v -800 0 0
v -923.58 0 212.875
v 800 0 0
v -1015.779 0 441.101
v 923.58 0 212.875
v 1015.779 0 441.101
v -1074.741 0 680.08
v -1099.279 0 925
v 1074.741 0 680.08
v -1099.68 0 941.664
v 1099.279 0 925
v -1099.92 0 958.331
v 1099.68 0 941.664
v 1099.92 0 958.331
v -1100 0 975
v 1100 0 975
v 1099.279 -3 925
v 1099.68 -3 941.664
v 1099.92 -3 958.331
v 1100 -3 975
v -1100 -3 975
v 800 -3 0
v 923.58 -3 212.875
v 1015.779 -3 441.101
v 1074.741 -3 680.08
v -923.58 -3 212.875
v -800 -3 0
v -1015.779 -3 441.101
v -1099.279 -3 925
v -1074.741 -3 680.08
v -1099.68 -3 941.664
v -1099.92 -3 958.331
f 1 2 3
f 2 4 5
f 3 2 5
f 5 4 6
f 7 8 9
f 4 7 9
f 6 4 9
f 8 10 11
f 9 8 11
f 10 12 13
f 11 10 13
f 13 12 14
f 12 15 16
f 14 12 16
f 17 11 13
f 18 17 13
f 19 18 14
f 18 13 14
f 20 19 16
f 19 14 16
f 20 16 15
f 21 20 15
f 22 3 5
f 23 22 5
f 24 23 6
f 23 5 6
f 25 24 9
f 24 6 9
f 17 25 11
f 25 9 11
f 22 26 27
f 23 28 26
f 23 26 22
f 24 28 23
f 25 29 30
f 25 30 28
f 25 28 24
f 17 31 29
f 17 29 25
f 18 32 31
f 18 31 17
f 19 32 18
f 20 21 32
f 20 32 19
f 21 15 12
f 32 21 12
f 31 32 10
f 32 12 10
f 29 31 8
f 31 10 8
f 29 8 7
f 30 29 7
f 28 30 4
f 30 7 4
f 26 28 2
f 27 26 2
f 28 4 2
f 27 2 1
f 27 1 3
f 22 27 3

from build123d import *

# Parameters (mm, degrees)
F0_W     = 100
F0_H     = 50
F0_W_2   = 600
F0_W_3   = 50
F0_W_4   = 775
F1_DEPTH = 3


with BuildPart() as f1:
    # F0 (on Front) → F1 (new body)
    with BuildSketch(Plane.XZ):
        with BuildLine():
            Line((-800, 92.0008493777), (-800, 0))
            Line((-800, 0), (-750, 0))
            Line((-750, 0), (-750, 50))
            Line((-750, 50), (-773.2805475772, 50))
            ThreePointArc((-773.2805475772, 50), (-786.7954423389, 70.9017119543), (-800.0000000001, 92.0008493776))
        make_face()
        with Locations((-700, 25)):
            Rectangle(F0_W, F0_H)
        with Locations((-350, 25)):
            Rectangle(F0_W_2, F0_H)
        with Locations((-25, 25)):
            Rectangle(F0_W_3, F0_H)
        with Locations((25, 25)):
            Rectangle(F0_W_3, F0_H)
        with Locations((350, 25)):
            Rectangle(F0_W_2, F0_H)
        with Locations((700, 25)):
            Rectangle(F0_W, F0_H)
        with BuildLine():
            Line((750, 0), (800, 0))
            Line((800, 0), (800, 92.0008493776))
            ThreePointArc((800.0000000001, 92.0008493776), (786.7954423389, 70.9017119543), (773.2805475772, 50))
            Line((773.2805475772, 50), (750, 50))
            Line((750, 50), (750, 0))
        make_face()
        with BuildLine():
            Line((-1049.2577214167, 925), (-1099.279129469, 925))
            ThreePointArc((-1099.279129469, 925), (-1015.7790507756, 441.1008996693), (-800, 0))
            Line((-800, 0), (-800, 92.0008493777))
            ThreePointArc((-800.0000000001, 92.0008493776), (-979.3055551093, 492.139557753), (-1049.2577214167, 925))
        make_face()
        with BuildLine():
            ThreePointArc((800, 0), (1015.7790507756, 441.1008996693), (1099.279129469, 925))
            Line((1099.279129469, 925), (1049.2577214167, 925))
            ThreePointArc((1049.2577214167, 925), (979.3055551094, 492.139557753), (800.0000000001, 92.0008493776))
            Line((800, 92.0008493776), (800, 0))
        make_face()
        with BuildLine():
            ThreePointArc((1099.279129469, 925), (1099.8197730031, 949.9974018634), (1100, 975))
            Line((1100, 975), (1050, 975))
            ThreePointArc((1050, 975), (1049.8144201308, 949.9972452643), (1049.2577214167, 925))
            Line((1049.2577214167, 925), (1099.279129469, 925))
        make_face()
        with BuildLine():
            Line((-1050, 975), (-1100, 975))
            ThreePointArc((-1100, 975), (-1099.8197730031, 949.9974018634), (-1099.279129469, 925))
            Line((-1099.279129469, 925), (-1049.2577214167, 925))
            ThreePointArc((-1049.2577214167, 925), (-1049.8144201308, 949.9972452643), (-1050, 975))
        make_face()
        with BuildLine():
            Line((-800, 925), (-1049.2577214167, 925))
            ThreePointArc((-1049.2577214167, 925), (-979.3055551093, 492.139557753), (-800.0000000001, 92.0008493776))
            Line((-800, 92.0008493777), (-800, 925))
        make_face()
        with BuildLine():
            Line((-25, 925), (-800, 925))
            Line((-800, 925), (-800, 92.0008493777))
            ThreePointArc((-800.0000000001, 92.0008493776), (-786.7954423389, 70.9017119543), (-773.2805475772, 50))
            Line((-773.2805475772, 50), (-750, 50))
            Line((-750, 50), (-650, 50))
            Line((-650, 50), (-50, 50))
            Line((-50, 50), (0, 50))
            Line((0, 50), (50, 50))
            Line((50, 50), (650, 50))
            Line((650, 50), (750, 50))
            Line((750, 50), (773.2805475772, 50))
            ThreePointArc((773.2805475772, 50), (786.7954423389, 70.9017119543), (800.0000000001, 92.0008493776))
            Line((800, 92.0008493776), (800, 925))
            Line((800, 925), (25, 925))
            Line((25, 925), (-25, 925))
        make_face()
        with BuildLine():
            ThreePointArc((800.0000000001, 92.0008493776), (979.3055551094, 492.139557753), (1049.2577214167, 925))
            Line((1049.2577214167, 925), (800, 925))
            Line((800, 925), (800, 92.0008493776))
        make_face()
        with BuildLine():
            ThreePointArc((1049.2577214167, 925), (1049.8144201308, 949.9972452643), (1050, 975))
            Line((1050, 975), (800, 975))
            Line((800, 975), (800, 925))
            Line((800, 925), (1049.2577214167, 925))
        make_face()
        with Locations((412.5, 950)):
            Rectangle(F0_W_4, F0_H)
        Polygon((25, 975), (0, 975), (-25, 975), (-25, 925), (25, 925), align=None)
        with Locations((-412.5, 950)):
            Rectangle(F0_W_4, F0_H)
        with BuildLine():
            Line((-800, 975), (-1050, 975))
            ThreePointArc((-1050, 975), (-1049.8144201308, 949.9972452643), (-1049.2577214167, 925))
            Line((-1049.2577214167, 925), (-800, 925))
            Line((-800, 925), (-800, 975))
        make_face()
    extrude(amount=F1_DEPTH)


solid = f1.part
